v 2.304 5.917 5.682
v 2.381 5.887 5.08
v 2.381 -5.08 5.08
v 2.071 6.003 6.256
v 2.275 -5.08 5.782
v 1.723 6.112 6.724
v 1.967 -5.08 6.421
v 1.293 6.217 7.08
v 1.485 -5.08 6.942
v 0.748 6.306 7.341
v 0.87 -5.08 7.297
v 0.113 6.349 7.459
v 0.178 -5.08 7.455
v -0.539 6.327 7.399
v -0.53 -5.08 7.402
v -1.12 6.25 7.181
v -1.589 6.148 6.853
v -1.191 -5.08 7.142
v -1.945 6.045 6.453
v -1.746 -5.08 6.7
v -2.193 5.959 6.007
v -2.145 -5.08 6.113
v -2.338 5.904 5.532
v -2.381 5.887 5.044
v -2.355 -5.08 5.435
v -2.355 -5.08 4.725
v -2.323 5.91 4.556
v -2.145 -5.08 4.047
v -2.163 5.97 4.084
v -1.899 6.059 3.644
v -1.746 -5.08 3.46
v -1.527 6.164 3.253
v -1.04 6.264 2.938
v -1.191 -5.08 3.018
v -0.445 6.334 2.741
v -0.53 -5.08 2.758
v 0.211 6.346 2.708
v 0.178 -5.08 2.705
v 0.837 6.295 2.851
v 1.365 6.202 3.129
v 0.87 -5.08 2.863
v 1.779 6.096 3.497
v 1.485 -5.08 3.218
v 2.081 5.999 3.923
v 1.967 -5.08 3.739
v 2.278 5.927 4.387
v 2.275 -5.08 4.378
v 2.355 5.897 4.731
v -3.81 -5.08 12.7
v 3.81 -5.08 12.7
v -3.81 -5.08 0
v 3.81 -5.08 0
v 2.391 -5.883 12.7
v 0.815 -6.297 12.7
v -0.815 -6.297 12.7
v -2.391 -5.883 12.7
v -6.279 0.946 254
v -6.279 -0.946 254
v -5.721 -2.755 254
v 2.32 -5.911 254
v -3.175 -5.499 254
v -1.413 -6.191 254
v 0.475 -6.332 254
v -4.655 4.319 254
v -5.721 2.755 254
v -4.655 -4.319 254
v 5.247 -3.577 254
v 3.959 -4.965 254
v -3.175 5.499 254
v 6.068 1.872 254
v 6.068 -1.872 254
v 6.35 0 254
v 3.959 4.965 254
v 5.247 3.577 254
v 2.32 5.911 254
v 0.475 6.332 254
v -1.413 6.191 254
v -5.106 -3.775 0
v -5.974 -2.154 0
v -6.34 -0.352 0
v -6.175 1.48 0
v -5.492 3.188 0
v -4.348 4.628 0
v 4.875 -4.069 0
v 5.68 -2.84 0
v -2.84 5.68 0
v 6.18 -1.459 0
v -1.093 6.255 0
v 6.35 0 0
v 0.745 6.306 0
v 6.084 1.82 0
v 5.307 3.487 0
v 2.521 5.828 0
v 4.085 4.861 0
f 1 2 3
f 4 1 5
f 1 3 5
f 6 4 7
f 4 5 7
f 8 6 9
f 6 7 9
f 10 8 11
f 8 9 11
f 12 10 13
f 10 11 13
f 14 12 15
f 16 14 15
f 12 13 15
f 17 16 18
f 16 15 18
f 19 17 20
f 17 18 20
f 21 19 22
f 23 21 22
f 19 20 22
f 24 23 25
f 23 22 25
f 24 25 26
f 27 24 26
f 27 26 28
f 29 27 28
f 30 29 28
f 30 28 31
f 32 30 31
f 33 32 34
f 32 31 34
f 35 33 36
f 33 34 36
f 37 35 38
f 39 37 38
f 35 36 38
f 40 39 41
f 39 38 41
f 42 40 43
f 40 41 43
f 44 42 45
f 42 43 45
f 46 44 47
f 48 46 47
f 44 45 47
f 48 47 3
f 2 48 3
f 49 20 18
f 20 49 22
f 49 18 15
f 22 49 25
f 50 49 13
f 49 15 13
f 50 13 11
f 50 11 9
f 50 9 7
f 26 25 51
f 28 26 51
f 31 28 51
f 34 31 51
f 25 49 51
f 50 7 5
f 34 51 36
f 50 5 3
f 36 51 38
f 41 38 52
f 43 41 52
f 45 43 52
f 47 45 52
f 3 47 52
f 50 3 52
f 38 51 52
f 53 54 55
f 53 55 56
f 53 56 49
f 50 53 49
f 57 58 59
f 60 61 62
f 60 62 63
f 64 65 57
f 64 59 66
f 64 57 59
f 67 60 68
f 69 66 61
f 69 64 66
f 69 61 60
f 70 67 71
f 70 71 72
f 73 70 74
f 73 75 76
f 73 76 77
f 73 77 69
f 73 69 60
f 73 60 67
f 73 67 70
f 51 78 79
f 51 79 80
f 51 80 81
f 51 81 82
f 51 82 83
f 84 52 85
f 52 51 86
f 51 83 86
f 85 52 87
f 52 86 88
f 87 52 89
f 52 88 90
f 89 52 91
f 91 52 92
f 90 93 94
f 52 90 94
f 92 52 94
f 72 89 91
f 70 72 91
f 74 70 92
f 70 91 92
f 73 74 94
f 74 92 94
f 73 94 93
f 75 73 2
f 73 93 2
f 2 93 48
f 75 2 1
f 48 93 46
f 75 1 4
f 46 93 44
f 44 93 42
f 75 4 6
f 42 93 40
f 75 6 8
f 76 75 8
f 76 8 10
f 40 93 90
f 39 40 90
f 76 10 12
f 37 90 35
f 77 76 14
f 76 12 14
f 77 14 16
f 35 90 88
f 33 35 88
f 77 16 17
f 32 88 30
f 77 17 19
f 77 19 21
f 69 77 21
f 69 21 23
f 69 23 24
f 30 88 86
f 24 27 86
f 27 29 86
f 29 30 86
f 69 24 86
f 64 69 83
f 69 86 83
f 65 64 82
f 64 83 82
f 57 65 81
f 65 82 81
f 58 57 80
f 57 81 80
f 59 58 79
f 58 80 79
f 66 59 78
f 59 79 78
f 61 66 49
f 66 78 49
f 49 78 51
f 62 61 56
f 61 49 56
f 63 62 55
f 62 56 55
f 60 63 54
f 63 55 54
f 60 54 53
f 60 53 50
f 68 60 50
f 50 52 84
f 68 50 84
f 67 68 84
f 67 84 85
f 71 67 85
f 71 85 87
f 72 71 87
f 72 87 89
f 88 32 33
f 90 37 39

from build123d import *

# Parameters (mm, degrees)
F0_R     = 6.35
F1_DEPTH = 254
F2_R     = 2.38125
F3_DEPTH = 12.7
F4_W     = 38.273203
F4_H     = 14.002507
F5_DEPTH = 12.7


with BuildPart() as f1:
    # F0 (on Top) → F1 (new body)
    with BuildSketch(Plane.XY):
        Circle(F0_R)
    extrude(amount=F1_DEPTH)

    # F2 (on Front) → F3 (cut, symmetric)
    with BuildSketch(Plane.XZ):
        with Locations((0, 5.08)):
            Circle(F2_R)
    extrude(amount=F3_DEPTH, both=True, mode=Mode.SUBTRACT)

    # F4 (on face) → F5 (cut)
    with BuildSketch(Plane(origin=(0, 0, 0), x_dir=(1, 0, 0), z_dir=(0, 0, -1))):
        with Locations((-1.712646, 12.081253)):
            Rectangle(F4_W, F4_H)
    extrude(amount=-F5_DEPTH, mode=Mode.SUBTRACT)


solid = f1.part
